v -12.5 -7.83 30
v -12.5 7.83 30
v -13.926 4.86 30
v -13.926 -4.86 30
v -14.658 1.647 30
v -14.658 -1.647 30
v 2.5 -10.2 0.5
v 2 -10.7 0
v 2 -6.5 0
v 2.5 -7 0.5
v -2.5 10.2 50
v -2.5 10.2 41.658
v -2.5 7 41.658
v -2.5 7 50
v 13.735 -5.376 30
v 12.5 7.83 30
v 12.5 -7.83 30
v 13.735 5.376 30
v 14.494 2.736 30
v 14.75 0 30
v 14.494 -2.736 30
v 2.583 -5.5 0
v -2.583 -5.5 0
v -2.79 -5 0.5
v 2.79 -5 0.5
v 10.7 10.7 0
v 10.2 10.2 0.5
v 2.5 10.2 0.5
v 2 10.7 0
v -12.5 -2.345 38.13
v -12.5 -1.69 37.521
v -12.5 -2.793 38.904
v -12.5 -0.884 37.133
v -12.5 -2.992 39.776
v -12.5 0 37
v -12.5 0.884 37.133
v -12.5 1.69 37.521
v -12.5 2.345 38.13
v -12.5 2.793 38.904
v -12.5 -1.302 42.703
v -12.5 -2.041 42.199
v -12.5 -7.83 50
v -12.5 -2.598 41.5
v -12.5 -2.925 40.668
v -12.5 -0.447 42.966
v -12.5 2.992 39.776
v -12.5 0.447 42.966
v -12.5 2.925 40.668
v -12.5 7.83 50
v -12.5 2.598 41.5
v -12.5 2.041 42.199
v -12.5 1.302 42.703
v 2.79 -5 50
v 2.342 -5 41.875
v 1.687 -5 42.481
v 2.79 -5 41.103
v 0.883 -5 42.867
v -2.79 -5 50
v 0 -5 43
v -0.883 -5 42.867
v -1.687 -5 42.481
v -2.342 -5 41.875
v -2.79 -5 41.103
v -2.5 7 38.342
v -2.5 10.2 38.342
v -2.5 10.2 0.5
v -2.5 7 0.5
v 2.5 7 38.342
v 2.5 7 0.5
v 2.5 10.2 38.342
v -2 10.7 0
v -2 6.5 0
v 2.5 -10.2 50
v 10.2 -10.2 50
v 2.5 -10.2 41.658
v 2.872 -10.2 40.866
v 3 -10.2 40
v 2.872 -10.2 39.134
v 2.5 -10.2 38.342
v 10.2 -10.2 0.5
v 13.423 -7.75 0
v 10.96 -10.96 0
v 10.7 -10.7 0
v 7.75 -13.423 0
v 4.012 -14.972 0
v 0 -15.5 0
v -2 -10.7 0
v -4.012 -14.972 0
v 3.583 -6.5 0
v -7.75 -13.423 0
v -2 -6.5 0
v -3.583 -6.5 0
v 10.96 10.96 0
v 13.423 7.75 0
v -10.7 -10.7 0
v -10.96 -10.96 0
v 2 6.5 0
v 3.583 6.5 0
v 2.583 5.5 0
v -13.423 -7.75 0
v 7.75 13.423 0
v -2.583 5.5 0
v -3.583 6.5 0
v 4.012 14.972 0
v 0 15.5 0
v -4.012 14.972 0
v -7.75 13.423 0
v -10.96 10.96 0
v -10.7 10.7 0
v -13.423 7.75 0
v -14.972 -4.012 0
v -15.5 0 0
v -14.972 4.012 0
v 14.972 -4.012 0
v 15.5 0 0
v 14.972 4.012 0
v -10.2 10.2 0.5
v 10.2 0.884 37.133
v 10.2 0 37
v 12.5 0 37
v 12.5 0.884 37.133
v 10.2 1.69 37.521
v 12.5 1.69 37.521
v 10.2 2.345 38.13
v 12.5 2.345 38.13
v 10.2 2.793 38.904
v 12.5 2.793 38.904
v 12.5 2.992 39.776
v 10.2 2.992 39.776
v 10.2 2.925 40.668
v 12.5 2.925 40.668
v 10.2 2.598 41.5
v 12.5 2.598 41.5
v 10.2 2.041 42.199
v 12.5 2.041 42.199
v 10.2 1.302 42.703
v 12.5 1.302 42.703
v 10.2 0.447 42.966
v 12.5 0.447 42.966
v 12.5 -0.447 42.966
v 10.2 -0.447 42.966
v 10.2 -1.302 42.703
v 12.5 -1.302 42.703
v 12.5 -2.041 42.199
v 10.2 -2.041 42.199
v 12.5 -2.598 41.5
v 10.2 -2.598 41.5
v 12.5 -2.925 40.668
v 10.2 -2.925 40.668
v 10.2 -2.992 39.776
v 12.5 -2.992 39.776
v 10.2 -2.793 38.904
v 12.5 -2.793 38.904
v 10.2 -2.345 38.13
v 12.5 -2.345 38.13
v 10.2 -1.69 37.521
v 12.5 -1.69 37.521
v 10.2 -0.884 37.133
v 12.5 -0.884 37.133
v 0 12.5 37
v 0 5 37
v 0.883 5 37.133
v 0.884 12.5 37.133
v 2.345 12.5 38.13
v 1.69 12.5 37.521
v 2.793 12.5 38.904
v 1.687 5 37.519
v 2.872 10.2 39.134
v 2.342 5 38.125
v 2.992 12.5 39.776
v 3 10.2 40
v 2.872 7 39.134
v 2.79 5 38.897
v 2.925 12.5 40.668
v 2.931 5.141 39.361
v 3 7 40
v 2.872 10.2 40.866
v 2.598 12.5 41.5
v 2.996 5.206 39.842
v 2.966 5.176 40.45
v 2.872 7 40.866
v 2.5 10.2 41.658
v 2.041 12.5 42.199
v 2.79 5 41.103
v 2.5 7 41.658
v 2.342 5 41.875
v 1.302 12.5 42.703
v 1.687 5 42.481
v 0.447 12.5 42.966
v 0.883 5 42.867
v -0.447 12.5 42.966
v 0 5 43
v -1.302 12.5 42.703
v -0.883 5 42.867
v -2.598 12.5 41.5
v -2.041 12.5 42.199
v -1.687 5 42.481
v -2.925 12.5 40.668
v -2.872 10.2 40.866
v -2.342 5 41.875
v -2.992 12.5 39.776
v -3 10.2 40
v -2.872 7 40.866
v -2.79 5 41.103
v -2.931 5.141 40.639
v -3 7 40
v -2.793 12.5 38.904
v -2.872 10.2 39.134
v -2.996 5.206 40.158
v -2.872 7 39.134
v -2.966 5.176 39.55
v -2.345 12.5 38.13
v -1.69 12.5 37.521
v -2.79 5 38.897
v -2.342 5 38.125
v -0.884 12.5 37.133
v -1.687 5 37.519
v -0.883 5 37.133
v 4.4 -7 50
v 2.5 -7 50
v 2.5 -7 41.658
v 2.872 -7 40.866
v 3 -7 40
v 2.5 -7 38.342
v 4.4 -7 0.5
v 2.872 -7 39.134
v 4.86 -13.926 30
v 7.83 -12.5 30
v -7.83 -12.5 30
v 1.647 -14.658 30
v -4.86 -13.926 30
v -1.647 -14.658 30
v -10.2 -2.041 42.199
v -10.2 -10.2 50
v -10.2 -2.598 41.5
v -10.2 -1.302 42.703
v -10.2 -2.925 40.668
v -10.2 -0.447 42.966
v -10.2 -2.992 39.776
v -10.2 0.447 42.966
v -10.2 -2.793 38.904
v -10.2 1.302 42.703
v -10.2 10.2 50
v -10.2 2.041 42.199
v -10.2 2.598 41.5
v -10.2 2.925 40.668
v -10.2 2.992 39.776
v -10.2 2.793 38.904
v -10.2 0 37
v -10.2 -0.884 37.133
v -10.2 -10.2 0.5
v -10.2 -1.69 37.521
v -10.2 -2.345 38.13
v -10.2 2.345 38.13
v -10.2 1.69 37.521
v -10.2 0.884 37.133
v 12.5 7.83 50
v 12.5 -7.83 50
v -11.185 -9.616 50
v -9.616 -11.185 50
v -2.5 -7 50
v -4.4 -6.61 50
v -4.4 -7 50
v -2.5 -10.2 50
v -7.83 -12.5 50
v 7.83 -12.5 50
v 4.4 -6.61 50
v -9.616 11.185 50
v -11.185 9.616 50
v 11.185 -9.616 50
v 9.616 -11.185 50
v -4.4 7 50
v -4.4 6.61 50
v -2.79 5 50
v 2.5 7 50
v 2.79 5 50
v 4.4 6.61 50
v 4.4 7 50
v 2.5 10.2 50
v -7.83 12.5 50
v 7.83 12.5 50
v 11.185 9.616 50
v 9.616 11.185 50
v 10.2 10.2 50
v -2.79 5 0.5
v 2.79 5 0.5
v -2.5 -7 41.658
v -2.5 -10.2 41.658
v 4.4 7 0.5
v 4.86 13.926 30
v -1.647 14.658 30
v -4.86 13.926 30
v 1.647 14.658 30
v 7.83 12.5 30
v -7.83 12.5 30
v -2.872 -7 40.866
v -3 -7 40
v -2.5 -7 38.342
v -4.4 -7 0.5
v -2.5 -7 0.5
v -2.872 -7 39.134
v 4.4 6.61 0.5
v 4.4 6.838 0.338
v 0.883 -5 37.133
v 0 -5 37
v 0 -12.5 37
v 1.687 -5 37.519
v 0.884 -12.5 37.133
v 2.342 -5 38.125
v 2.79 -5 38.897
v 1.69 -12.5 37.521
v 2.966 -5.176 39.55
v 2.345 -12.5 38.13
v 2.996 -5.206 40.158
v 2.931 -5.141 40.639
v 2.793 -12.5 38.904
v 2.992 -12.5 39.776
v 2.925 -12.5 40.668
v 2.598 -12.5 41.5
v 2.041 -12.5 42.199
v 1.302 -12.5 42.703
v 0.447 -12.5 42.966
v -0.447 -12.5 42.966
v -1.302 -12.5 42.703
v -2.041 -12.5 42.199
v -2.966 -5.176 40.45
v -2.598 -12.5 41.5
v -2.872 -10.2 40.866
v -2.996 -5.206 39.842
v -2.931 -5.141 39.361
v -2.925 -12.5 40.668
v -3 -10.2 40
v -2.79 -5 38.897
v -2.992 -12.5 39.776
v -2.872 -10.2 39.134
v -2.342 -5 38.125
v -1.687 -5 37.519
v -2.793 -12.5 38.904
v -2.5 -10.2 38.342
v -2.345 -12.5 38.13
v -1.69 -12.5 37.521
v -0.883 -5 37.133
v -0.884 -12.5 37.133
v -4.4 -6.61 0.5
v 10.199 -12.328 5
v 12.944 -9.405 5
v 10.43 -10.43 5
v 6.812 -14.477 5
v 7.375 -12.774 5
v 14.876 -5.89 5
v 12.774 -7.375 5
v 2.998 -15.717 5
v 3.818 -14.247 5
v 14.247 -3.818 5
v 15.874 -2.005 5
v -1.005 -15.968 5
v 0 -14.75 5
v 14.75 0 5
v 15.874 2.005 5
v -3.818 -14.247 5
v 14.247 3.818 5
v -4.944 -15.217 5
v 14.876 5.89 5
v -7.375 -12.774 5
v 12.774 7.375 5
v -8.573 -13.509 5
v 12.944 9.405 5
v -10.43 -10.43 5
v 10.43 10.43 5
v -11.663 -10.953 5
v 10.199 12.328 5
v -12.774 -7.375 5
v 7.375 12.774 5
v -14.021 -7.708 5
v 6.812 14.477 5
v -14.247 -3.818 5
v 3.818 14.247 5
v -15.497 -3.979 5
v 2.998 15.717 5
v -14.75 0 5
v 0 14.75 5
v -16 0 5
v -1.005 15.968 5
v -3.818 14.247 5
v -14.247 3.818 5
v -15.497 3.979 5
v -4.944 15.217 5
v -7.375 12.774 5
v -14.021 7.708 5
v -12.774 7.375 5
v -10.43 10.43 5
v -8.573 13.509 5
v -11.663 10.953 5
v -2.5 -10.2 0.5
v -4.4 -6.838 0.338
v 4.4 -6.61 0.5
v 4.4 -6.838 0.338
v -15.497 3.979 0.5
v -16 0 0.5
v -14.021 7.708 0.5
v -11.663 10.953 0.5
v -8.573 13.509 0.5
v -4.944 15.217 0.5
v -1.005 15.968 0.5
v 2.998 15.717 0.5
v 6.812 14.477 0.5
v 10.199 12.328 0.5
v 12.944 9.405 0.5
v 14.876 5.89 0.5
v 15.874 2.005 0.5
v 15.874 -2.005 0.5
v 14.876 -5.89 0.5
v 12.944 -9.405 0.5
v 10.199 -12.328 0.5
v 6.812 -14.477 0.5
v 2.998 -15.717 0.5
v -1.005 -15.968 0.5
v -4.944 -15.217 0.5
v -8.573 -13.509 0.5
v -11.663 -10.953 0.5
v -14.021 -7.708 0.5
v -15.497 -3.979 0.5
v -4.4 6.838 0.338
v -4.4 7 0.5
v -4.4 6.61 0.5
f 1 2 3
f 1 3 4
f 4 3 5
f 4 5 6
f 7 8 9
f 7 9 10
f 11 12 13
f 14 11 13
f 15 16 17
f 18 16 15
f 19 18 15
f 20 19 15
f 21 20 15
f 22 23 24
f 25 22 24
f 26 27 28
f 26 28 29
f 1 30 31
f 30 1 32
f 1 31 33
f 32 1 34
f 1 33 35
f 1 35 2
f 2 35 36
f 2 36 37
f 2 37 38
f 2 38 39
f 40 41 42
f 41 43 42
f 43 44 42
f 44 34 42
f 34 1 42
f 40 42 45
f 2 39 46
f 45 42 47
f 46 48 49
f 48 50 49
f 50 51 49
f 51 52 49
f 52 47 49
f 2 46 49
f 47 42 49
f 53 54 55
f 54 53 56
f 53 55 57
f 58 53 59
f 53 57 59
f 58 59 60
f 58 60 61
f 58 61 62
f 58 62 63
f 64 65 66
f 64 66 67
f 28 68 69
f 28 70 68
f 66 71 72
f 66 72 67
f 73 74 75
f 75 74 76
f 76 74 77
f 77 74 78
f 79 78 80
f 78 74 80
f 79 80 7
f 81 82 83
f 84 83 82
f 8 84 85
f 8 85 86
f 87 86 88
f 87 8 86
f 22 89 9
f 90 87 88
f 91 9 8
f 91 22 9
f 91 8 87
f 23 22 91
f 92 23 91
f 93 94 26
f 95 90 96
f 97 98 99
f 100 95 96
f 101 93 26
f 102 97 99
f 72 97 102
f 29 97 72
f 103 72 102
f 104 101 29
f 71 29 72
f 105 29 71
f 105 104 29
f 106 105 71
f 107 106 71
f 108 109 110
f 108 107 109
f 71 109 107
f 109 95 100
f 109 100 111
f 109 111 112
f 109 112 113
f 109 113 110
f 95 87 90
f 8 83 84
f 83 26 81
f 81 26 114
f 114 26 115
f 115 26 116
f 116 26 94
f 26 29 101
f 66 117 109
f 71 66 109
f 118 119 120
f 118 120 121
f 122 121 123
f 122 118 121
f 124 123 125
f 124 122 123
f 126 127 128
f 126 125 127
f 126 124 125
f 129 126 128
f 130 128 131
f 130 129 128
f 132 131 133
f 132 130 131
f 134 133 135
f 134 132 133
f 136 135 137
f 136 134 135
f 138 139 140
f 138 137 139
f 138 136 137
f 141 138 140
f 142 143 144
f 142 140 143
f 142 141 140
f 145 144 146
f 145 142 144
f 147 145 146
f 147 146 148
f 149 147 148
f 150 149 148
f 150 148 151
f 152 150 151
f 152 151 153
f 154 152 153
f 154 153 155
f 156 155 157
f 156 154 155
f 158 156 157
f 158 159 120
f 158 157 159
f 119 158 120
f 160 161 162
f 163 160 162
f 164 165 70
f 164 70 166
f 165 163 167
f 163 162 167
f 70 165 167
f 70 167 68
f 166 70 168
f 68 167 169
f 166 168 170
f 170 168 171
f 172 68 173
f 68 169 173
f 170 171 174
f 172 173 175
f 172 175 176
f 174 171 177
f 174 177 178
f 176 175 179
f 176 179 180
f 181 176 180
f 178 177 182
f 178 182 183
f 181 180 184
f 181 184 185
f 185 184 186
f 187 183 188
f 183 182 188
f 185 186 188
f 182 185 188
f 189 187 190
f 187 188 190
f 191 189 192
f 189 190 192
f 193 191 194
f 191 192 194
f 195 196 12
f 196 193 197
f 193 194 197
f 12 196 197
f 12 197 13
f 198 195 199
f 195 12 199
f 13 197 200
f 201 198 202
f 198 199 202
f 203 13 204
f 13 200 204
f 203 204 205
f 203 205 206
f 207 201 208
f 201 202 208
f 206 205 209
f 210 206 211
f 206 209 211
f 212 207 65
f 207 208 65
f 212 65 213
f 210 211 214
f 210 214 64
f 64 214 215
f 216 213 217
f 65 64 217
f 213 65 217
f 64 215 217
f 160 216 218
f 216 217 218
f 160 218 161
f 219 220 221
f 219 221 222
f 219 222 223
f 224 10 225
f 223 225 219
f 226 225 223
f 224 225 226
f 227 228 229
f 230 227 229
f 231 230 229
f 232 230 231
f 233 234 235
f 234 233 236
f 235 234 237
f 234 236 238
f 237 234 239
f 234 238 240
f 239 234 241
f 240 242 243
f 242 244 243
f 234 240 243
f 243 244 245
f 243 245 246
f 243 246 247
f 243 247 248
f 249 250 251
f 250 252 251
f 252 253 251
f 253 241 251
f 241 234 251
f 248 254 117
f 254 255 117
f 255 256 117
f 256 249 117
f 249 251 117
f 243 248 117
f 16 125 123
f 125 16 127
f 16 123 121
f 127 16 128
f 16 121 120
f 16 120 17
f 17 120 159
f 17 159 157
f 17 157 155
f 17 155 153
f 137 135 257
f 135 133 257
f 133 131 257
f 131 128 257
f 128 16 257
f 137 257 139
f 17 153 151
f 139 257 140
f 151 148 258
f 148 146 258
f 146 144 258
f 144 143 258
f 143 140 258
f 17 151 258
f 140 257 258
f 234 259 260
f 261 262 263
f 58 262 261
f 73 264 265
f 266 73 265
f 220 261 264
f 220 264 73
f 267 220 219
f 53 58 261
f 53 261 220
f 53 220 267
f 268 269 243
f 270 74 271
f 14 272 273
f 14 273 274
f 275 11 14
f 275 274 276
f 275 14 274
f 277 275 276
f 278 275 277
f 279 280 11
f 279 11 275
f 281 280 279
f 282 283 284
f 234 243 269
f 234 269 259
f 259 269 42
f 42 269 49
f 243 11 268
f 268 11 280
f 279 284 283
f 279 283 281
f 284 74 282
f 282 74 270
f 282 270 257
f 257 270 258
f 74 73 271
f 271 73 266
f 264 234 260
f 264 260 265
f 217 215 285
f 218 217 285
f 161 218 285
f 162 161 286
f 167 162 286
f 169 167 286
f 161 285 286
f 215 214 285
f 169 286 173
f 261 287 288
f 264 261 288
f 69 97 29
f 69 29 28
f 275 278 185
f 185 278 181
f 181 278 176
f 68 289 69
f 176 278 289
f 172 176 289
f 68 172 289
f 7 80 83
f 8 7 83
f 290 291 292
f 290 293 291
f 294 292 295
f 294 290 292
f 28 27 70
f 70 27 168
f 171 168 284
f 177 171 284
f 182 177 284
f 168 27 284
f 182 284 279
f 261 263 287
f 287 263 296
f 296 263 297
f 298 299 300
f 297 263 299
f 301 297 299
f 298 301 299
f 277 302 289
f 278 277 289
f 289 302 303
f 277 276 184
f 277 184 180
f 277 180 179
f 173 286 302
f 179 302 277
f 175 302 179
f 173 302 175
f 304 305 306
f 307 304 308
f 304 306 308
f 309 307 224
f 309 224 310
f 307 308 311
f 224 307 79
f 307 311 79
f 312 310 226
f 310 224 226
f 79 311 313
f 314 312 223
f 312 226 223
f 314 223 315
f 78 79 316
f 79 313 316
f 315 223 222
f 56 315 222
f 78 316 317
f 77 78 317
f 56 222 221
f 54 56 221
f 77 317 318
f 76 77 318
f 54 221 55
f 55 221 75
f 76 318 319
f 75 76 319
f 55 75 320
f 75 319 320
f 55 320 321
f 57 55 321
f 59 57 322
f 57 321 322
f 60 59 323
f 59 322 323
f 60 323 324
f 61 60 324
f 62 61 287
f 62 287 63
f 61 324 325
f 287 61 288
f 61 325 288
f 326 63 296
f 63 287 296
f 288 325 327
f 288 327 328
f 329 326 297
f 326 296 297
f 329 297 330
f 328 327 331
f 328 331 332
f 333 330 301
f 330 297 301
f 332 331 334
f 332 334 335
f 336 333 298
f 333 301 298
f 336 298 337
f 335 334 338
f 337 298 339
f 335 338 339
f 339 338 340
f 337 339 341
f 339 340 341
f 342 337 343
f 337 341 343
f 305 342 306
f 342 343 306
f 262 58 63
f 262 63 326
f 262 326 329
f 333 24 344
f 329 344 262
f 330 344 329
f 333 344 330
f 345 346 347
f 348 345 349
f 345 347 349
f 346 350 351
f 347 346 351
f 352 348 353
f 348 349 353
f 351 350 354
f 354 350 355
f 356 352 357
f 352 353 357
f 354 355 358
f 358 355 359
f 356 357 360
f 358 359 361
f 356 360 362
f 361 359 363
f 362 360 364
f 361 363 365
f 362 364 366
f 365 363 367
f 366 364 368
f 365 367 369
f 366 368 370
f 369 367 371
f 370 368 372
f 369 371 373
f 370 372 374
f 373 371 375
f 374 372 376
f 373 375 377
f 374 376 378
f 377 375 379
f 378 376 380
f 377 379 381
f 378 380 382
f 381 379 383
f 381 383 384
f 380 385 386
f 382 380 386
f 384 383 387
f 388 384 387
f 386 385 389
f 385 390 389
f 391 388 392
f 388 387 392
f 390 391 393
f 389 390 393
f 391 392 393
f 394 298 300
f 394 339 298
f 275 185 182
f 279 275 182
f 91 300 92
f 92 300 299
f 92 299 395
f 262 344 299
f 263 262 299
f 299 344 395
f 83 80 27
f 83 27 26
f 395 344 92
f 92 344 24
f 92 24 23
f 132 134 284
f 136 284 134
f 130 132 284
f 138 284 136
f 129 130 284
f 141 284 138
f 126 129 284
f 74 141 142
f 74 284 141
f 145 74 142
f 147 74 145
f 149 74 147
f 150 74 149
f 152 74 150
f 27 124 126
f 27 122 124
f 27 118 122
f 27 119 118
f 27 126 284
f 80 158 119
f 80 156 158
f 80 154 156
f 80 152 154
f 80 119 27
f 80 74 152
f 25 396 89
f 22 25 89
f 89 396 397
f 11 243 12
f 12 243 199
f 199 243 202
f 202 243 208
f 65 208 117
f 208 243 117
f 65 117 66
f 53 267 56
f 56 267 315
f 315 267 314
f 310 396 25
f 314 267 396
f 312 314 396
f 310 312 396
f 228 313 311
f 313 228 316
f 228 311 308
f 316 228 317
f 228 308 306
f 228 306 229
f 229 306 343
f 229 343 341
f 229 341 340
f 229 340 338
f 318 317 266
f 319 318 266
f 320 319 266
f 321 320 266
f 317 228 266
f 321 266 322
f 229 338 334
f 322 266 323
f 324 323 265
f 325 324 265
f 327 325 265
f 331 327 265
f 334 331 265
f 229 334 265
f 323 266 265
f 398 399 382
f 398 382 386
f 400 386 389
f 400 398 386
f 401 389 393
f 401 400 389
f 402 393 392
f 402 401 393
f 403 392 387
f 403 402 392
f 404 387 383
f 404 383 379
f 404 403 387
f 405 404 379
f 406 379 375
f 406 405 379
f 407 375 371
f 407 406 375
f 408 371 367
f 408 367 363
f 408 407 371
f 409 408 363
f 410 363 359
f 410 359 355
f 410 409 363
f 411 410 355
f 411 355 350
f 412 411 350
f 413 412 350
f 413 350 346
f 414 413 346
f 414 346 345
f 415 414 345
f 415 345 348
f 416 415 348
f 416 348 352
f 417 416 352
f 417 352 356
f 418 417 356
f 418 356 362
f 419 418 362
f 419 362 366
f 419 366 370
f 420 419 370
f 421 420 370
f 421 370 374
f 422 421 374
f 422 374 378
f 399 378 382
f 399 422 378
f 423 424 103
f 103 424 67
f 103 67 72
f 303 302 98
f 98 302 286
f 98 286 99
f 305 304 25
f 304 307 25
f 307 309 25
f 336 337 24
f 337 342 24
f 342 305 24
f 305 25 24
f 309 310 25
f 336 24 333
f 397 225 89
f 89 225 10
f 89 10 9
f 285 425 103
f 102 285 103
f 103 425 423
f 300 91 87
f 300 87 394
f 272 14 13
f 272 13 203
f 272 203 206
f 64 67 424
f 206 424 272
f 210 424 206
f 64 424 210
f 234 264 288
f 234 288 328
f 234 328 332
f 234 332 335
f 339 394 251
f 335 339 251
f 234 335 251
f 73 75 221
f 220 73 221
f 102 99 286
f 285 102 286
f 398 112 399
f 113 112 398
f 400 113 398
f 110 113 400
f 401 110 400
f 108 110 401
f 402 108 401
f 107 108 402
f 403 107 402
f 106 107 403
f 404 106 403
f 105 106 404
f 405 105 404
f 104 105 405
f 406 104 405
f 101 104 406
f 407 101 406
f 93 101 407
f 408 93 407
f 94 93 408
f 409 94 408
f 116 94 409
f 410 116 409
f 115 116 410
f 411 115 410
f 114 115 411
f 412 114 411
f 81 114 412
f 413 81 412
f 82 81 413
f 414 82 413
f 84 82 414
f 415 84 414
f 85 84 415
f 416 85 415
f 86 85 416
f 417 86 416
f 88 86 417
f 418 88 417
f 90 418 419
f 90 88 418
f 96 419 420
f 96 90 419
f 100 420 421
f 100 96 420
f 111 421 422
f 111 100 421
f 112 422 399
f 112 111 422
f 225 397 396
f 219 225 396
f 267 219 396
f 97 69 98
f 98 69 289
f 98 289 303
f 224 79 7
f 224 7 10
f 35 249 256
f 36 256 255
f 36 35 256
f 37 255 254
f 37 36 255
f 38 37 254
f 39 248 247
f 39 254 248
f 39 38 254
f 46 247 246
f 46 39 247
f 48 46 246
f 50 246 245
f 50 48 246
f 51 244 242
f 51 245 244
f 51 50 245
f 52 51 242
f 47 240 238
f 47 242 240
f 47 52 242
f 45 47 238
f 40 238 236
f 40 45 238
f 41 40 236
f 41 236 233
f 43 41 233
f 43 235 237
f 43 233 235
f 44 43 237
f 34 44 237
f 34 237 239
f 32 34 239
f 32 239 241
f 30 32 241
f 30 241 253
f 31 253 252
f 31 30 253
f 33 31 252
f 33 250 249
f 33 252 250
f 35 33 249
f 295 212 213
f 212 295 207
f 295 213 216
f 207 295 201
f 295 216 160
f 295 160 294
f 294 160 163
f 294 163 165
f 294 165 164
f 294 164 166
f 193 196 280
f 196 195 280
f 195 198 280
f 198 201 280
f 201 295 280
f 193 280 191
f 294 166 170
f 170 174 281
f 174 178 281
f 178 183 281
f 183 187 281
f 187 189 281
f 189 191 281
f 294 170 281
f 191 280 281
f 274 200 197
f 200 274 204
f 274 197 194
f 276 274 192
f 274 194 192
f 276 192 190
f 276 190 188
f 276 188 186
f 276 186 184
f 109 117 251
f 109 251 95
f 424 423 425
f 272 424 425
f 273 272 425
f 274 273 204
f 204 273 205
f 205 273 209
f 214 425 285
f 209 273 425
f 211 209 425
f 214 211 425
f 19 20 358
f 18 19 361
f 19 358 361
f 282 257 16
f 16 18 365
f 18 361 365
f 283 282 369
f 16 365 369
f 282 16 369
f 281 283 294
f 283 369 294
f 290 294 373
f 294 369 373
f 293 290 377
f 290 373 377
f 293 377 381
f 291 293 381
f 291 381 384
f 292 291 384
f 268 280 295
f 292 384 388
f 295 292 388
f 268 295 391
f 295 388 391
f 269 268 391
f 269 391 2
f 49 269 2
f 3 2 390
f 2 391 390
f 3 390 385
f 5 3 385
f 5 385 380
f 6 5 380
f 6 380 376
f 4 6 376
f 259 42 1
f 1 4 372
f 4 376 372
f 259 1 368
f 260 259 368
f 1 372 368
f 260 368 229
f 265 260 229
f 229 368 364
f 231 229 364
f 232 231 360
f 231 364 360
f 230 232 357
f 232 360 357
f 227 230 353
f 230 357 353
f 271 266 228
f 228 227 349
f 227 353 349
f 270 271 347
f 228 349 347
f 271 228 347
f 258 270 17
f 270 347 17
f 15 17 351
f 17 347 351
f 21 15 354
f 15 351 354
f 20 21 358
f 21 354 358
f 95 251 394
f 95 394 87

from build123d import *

# Parameters (mm, degrees)
SKETCH1_R           = 14.75
BOSS_EXTRUDE1_DEPTH = 50
SKETCH6_R           = 16
SKETCH6_R_2         = 14.75
BOSS_EXTRUDE4_DEPTH = 5
CUT_EXTRUDE3_DEPTH  = 20
SKETCH8_R           = 3
CUT_EXTRUDE4_DEPTH  = 60.73483071
CHAMFER2_SIZE       = 0.5


with BuildPart() as part:
    # Sketch1 → Boss-Extrude1 (new body)
    with BuildSketch(Plane.XY):
        Circle(SKETCH1_R)
        Polygon((-10.2, 10.2), (-2.5, 10.2), (-2.5, 7), (-4.4, 7), (-4.4, 6.61), (-2.79, 5), (2.79, 5), (4.4, 6.61), (4.4, 7), (2.5, 7), (2.5, 10.2), (10.2, 10.2), (10.2, 2.5), (10.2, -2.5), (10.2, -10.2), (2.5, -10.2), (2.5, -7), (4.4, -7), (4.4, -6.61), (2.79, -5), (-2.79, -5), (-4.4, -6.61), (-4.4, -7), (-2.5, -7), (-2.5, -10.2), (-10.2, -10.2), (-10.2, -2.5), (-10.2, 2.5), align=None, mode=Mode.SUBTRACT)
    extrude(amount=BOSS_EXTRUDE1_DEPTH)

    # Sketch6 → Boss-Extrude4 (add)
    with BuildSketch(Plane(origin=(0, 0, 0), x_dir=(-1, 0, 0), z_dir=(0, 0, -1))):
        Circle(SKETCH6_R)
        Circle(SKETCH6_R_2, mode=Mode.SUBTRACT)
    extrude(amount=-BOSS_EXTRUDE4_DEPTH)

    # Sketch7 → Cut-Extrude3 (cut)
    with BuildSketch(Plane.XY.offset(50)):
        Polygon((0, -12.5), (11.066614126, -12.5), (11.066614126, -16.552961951), (-11.340768707, -16.552961951), (-11.340768707, -12.5), align=None)
        Polygon((-11.340768707, 12.5), (0, 12.5), (11.066614126, 12.5), (11.066614126, 16.552961951), (-11.340768707, 16.552961951), align=None)
        Polygon((12.5, 0), (12.5, 11.066614126), (16.552961951, 11.066614126), (16.552961951, -11.340768707), (12.5, -11.340768707), align=None)
        Polygon((-12.5, -11.340768707), (-12.5, 0), (-12.5, 11.066614126), (-16.552961951, 11.066614126), (-16.552961951, -11.340768707), align=None)
    extrude(amount=-CUT_EXTRUDE3_DEPTH, mode=Mode.SUBTRACT)

    # Sketch8 → Cut-Extrude4 (cut, through all)
    with BuildSketch(Plane.XZ.offset(12.5)):
        with Locations(Location((0, 40, 0), (0, 0, 270))):
            Circle(SKETCH8_R)
    cut_extrude4 = extrude(amount=-CUT_EXTRUDE4_DEPTH, mode=Mode.SUBTRACT)

    # Mirror1: Cut-Extrude4 across plane
    add(cut_extrude4.mirror(Plane(origin=(0, 0, 0), x_dir=(0, 0, 1), z_dir=(0.7071067811865495, -0.7071067811865457, 0))), mode=Mode.SUBTRACT)

    # Chamfer2
    # the kernel refuses this chamfer: 0.5 mm, written as the material it takes off along each edge
    with BuildSketch(Plane(origin=(-5.30922724, 7.51922724, 0), x_dir=(-0.019442520806013736, -0.01944252080601385, 0.9996219169112968), z_dir=(0.7071067811865497, -0.7071067811865455, 0)), Plane(origin=(1.88077276, 4.09077276, 0), x_dir=(0.019442520806013972, -0.01944252080601405, 0.9996219169112968), z_dir=(0.7071067811865489, 0.7071067811865461, 0)), Plane(origin=(5.30922724, -7.51922724, 0), x_dir=(0.019442520806013767, 0.019442520806013813, 0.9996219169112968), z_dir=(-0.7071067811865485, 0.7071067811865467, 0)), Plane(origin=(-1.88077276, -4.09077276, 0), x_dir=(-0.019442520806013986, 0.019442520806014035, 0.9996219169112968), z_dir=(-0.7071067811865485, -0.7071067811865467, 0))) as chamfer2_piece_1:
        Polygon((CHAMFER2_SIZE * 0.999621916911, -CHAMFER2_SIZE * 0.0274958766106), (-CHAMFER2_SIZE * 0.0274958766106, -CHAMFER2_SIZE * 0.999621916911), (0, 0), align=None)
    extrude(amount=4.848566823, mode=Mode.SUBTRACT)
    with BuildSketch(Plane(origin=(-4.075841494, 5, 0), x_dir=(0, 0.9996219169112968, -0.02749587661058639), z_dir=(1, 0, 0)), Plane(origin=(4.075841494, -5, 0), x_dir=(0, -0.9996219169112968, -0.02749587661058639), z_dir=(-1, 0, 0))) as chamfer2_piece_2:
        Polygon((CHAMFER2_SIZE * 0.999621916911, CHAMFER2_SIZE * 0.0274958766106), (-CHAMFER2_SIZE * 0.0274958766106, CHAMFER2_SIZE * 0.999621916911), (0, 0), align=None)
    extrude(amount=8.151682988, mode=Mode.SUBTRACT)
    with BuildSketch(Plane(origin=(5.685841494, 7, 0), x_dir=(0, 0.02749587661058563, 0.9996219169112968), z_dir=(-1, 0, 0)), Plane(origin=(2.5, -7, 0), x_dir=(0, -0.02749587661058563, 0.9996219169112968), z_dir=(1, 0, 0)), Plane(origin=(-5.685841494, -7, 0), x_dir=(0, -0.02749587661058563, 0.9996219169112968), z_dir=(1, 0, 0)), Plane(origin=(-2.5, 7, 0), x_dir=(0, 0.02749587661058563, 0.9996219169112968), z_dir=(-1, 0, 0))) as chamfer2_piece_3:
        Polygon((CHAMFER2_SIZE * 0.999621916911, -CHAMFER2_SIZE * 0.0274958766106), (-CHAMFER2_SIZE * 0.0274958766106, -CHAMFER2_SIZE * 0.999621916911), (0, 0), align=None)
    extrude(amount=3.185841494, mode=Mode.SUBTRACT)
    with BuildSketch(Plane(origin=(2.5, 7, 0), x_dir=(-0.9996219169112968, 2.3583319446590707e-15, -0.027495876610586365), z_dir=(0, 1, 0)), Plane(origin=(2.5, -10.2, 0), x_dir=(-0.9996219169112968, -2.0808811276403563e-15, -0.027495876610586365), z_dir=(0, 1, 0)), Plane(origin=(-2.5, -7, 0), x_dir=(0.9996219169112968, -2.0808811276403563e-15, -0.027495876610586365), z_dir=(0, -1, 0)), Plane(origin=(-2.5, 10.2, 0), x_dir=(0.9996219169112968, -9.19749458417038e-14, -0.027495876610586365), z_dir=(0, -1, 0))) as chamfer2_piece_4:
        Polygon((CHAMFER2_SIZE * 0.999621916911, CHAMFER2_SIZE * 0.0274958766106), (-CHAMFER2_SIZE * 0.0274958766106, CHAMFER2_SIZE * 0.999621916911), (0, 0), align=None)
    extrude(amount=3.2, mode=Mode.SUBTRACT)
    with BuildSketch(Plane(origin=(2.5, 10.2, 0), x_dir=(0, -0.02749587661058563, 0.9996219169112968), z_dir=(1, 0, 0)), Plane(origin=(10.2, -10.2, 0), x_dir=(0, 0.02749587661058563, 0.9996219169112968), z_dir=(-1, 0, 0)), Plane(origin=(-2.5, -10.2, 0), x_dir=(0, 0.02749587661058563, 0.9996219169112968), z_dir=(-1, 0, 0)), Plane(origin=(-10.2, 10.2, 0), x_dir=(0, -0.02749587661058563, 0.9996219169112968), z_dir=(1, 0, 0))) as chamfer2_piece_5:
        Polygon((CHAMFER2_SIZE * 0.999621916911, -CHAMFER2_SIZE * 0.0274958766106), (-CHAMFER2_SIZE * 0.0274958766106, -CHAMFER2_SIZE * 0.999621916911), (0, 0), align=None)
    extrude(amount=7.7, mode=Mode.SUBTRACT)
    with BuildSketch(Plane(origin=(10.2, 10.2, 0), x_dir=(-0.02749587661058563, 0, 0.9996219169112968), z_dir=(0, -1, 0)), Plane(origin=(-10.2, -10.2, 0), x_dir=(0.02749587661058563, 0, 0.9996219169112968), z_dir=(0, 1, 0))) as chamfer2_piece_6:
        Polygon((CHAMFER2_SIZE * 0.999621916911, -CHAMFER2_SIZE * 0.0274958766106), (-CHAMFER2_SIZE * 0.0274958766106, -CHAMFER2_SIZE * 0.999621916911), (0, 0), align=None)
    extrude(amount=20.4, mode=Mode.SUBTRACT)
    with BuildSketch(Plane(origin=(0, 0, 0), x_dir=(-1, 0, 0), z_dir=(0, -1, 0))) as chamfer2_piece_7:
        Polygon((16, -CHAMFER2_SIZE), (16 - CHAMFER2_SIZE, 0), (16, 0), align=None)
    revolve(axis=Axis((0, 0, 0), (0, 0, -1)), mode=Mode.SUBTRACT)
    with BuildSketch(Plane(origin=(5.685841494, 7, 0), x_dir=(0, 0.02749587661058563, 0.9996219169112968), z_dir=(-1, 0, 0))) as chamfer2_piece_8a_section:
        Polygon((CHAMFER2_SIZE * 0.999621916911, -CHAMFER2_SIZE * 0.0274958766106), (-CHAMFER2_SIZE * 0.0274958766106, -CHAMFER2_SIZE * 0.999621916911), (0, 0), align=None)
    chamfer2_piece_8a = extrude(amount=4.471682988, mode=Mode.PRIVATE)
    chamfer2_piece_8a = split(chamfer2_piece_8a, bisect_by=Plane(origin=(2.5, 6.835103187, 0.164896813), z_dir=(-1, 0, 0)), keep=Keep.TOP, mode=Mode.PRIVATE)
    with BuildSketch(Plane(origin=(2.5, 5.714158506, 0), x_dir=(-0.9996219169112968, 2.3583319446590707e-15, -0.027495876610586365), z_dir=(0, 1, 0))) as chamfer2_piece_8b_section:
        Polygon((CHAMFER2_SIZE * 0.999621916911, CHAMFER2_SIZE * 0.0274958766106), (-CHAMFER2_SIZE * 0.0274958766106, CHAMFER2_SIZE * 0.999621916911), (0, 0), align=None)
    chamfer2_piece_8b = extrude(amount=4.485841494, mode=Mode.PRIVATE)
    chamfer2_piece_8b = split(chamfer2_piece_8b, bisect_by=Plane(origin=(2.335103187, 7, 0.164896813), z_dir=(0, -1, 0)), keep=Keep.TOP, mode=Mode.PRIVATE)
    chamfer2_piece_8 = chamfer2_piece_8a & chamfer2_piece_8b
    add(chamfer2_piece_8, mode=Mode.SUBTRACT)
    with BuildSketch(Plane(origin=(1.214158506, 10.2, 0), x_dir=(0, -0.02749587661058563, 0.9996219169112968), z_dir=(1, 0, 0))) as chamfer2_piece_9a_section:
        Polygon((CHAMFER2_SIZE * 0.999621916911, -CHAMFER2_SIZE * 0.0274958766106), (-CHAMFER2_SIZE * 0.0274958766106, -CHAMFER2_SIZE * 0.999621916911), (0, 0), align=None)
    chamfer2_piece_9a = extrude(amount=8.985841494, mode=Mode.PRIVATE)
    chamfer2_piece_9a = split(chamfer2_piece_9a, bisect_by=Plane(origin=(2.5, 10.364896813, 0.164896813), z_dir=(-1, 0, 0)), keep=Keep.TOP, mode=Mode.PRIVATE)
    with BuildSketch(Plane(origin=(2.5, 7, 0), x_dir=(-0.9996219169112968, 2.3583319446590707e-15, -0.027495876610586365), z_dir=(0, 1, 0))) as chamfer2_piece_9b_section:
        Polygon((CHAMFER2_SIZE * 0.999621916911, CHAMFER2_SIZE * 0.0274958766106), (-CHAMFER2_SIZE * 0.0274958766106, CHAMFER2_SIZE * 0.999621916911), (0, 0), align=None)
    chamfer2_piece_9b = extrude(amount=4.485841494, mode=Mode.PRIVATE)
    chamfer2_piece_9b = split(chamfer2_piece_9b, bisect_by=Plane(origin=(2.335103187, 10.2, 0.164896813), z_dir=(0, 1, 0)), keep=Keep.TOP, mode=Mode.PRIVATE)
    chamfer2_piece_9 = chamfer2_piece_9a & chamfer2_piece_9b
    add(chamfer2_piece_9, mode=Mode.SUBTRACT)
    with BuildSketch(Plane(origin=(2.5, 10.2, 0), x_dir=(0, -0.02749587661058563, 0.9996219169112968), z_dir=(1, 0, 0))) as chamfer2_piece_10a_section:
        Polygon((CHAMFER2_SIZE * 0.999621916911, -CHAMFER2_SIZE * 0.0274958766106), (-CHAMFER2_SIZE * 0.0274958766106, -CHAMFER2_SIZE * 0.999621916911), (0, 0), align=None)
    chamfer2_piece_10a = extrude(amount=8.985841494, mode=Mode.PRIVATE)
    chamfer2_piece_10a = split(chamfer2_piece_10a, bisect_by=Plane(origin=(10.2, 10.364896813, 0.164896813), z_dir=(1, 0, 0)), keep=Keep.TOP, mode=Mode.PRIVATE)
    with BuildSketch(Plane(origin=(10.2, 11.485841494, 0), x_dir=(-0.02749587661058563, 0, 0.9996219169112968), z_dir=(0, -1, 0))) as chamfer2_piece_10b_section:
        Polygon((CHAMFER2_SIZE * 0.999621916911, -CHAMFER2_SIZE * 0.0274958766106), (-CHAMFER2_SIZE * 0.0274958766106, -CHAMFER2_SIZE * 0.999621916911), (0, 0), align=None)
    chamfer2_piece_10b = extrude(amount=21.685841494, mode=Mode.PRIVATE)
    chamfer2_piece_10b = split(chamfer2_piece_10b, bisect_by=Plane(origin=(10.364896813, 10.2, 0.164896813), z_dir=(0, 1, 0)), keep=Keep.TOP, mode=Mode.PRIVATE)
    chamfer2_piece_10 = chamfer2_piece_10a & chamfer2_piece_10b
    add(chamfer2_piece_10, mode=Mode.SUBTRACT)
    with BuildSketch(Plane(origin=(10.2, 10.2, 0), x_dir=(-0.02749587661058563, 0, 0.9996219169112968), z_dir=(0, -1, 0))) as chamfer2_piece_11a_section:
        Polygon((CHAMFER2_SIZE * 0.999621916911, -CHAMFER2_SIZE * 0.0274958766106), (-CHAMFER2_SIZE * 0.0274958766106, -CHAMFER2_SIZE * 0.999621916911), (0, 0), align=None)
    chamfer2_piece_11a = extrude(amount=21.685841494, mode=Mode.PRIVATE)
    chamfer2_piece_11a = split(chamfer2_piece_11a, bisect_by=Plane(origin=(10.364896813, -10.2, 0.164896813), z_dir=(0, -1, 0)), keep=Keep.TOP, mode=Mode.PRIVATE)
    with BuildSketch(Plane(origin=(11.485841494, -10.2, 0), x_dir=(0, 0.02749587661058563, 0.9996219169112968), z_dir=(-1, 0, 0))) as chamfer2_piece_11b_section:
        Polygon((CHAMFER2_SIZE * 0.999621916911, -CHAMFER2_SIZE * 0.0274958766106), (-CHAMFER2_SIZE * 0.0274958766106, -CHAMFER2_SIZE * 0.999621916911), (0, 0), align=None)
    chamfer2_piece_11b = extrude(amount=8.985841494, mode=Mode.PRIVATE)
    chamfer2_piece_11b = split(chamfer2_piece_11b, bisect_by=Plane(origin=(10.2, -10.364896813, 0.164896813), z_dir=(1, 0, 0)), keep=Keep.TOP, mode=Mode.PRIVATE)
    chamfer2_piece_11 = chamfer2_piece_11a & chamfer2_piece_11b
    add(chamfer2_piece_11, mode=Mode.SUBTRACT)
    with BuildSketch(Plane(origin=(10.2, -10.2, 0), x_dir=(0, 0.02749587661058563, 0.9996219169112968), z_dir=(-1, 0, 0))) as chamfer2_piece_12a_section:
        Polygon((CHAMFER2_SIZE * 0.999621916911, -CHAMFER2_SIZE * 0.0274958766106), (-CHAMFER2_SIZE * 0.0274958766106, -CHAMFER2_SIZE * 0.999621916911), (0, 0), align=None)
    chamfer2_piece_12a = extrude(amount=8.985841494, mode=Mode.PRIVATE)
    chamfer2_piece_12a = split(chamfer2_piece_12a, bisect_by=Plane(origin=(2.5, -10.364896813, 0.164896813), z_dir=(-1, 0, 0)), keep=Keep.TOP, mode=Mode.PRIVATE)
    with BuildSketch(Plane(origin=(2.5, -11.485841494, 0), x_dir=(-0.9996219169112968, -2.0808811276403563e-15, -0.027495876610586365), z_dir=(0, 1, 0))) as chamfer2_piece_12b_section:
        Polygon((CHAMFER2_SIZE * 0.999621916911, CHAMFER2_SIZE * 0.0274958766106), (-CHAMFER2_SIZE * 0.0274958766106, CHAMFER2_SIZE * 0.999621916911), (0, 0), align=None)
    chamfer2_piece_12b = extrude(amount=4.485841494, mode=Mode.PRIVATE)
    chamfer2_piece_12b = split(chamfer2_piece_12b, bisect_by=Plane(origin=(2.335103187, -10.2, 0.164896813), z_dir=(0, -1, 0)), keep=Keep.TOP, mode=Mode.PRIVATE)
    chamfer2_piece_12 = chamfer2_piece_12a & chamfer2_piece_12b
    add(chamfer2_piece_12, mode=Mode.SUBTRACT)
    with BuildSketch(Plane(origin=(1.214158506, -7, 0), x_dir=(0, -0.02749587661058563, 0.9996219169112968), z_dir=(1, 0, 0))) as chamfer2_piece_13a_section:
        Polygon((CHAMFER2_SIZE * 0.999621916911, -CHAMFER2_SIZE * 0.0274958766106), (-CHAMFER2_SIZE * 0.0274958766106, -CHAMFER2_SIZE * 0.999621916911), (0, 0), align=None)
    chamfer2_piece_13a = extrude(amount=4.471682988, mode=Mode.PRIVATE)
    chamfer2_piece_13a = split(chamfer2_piece_13a, bisect_by=Plane(origin=(2.5, -6.835103187, 0.164896813), z_dir=(-1, 0, 0)), keep=Keep.TOP, mode=Mode.PRIVATE)
    with BuildSketch(Plane(origin=(2.5, -10.2, 0), x_dir=(-0.9996219169112968, -2.0808811276403563e-15, -0.027495876610586365), z_dir=(0, 1, 0))) as chamfer2_piece_13b_section:
        Polygon((CHAMFER2_SIZE * 0.999621916911, CHAMFER2_SIZE * 0.0274958766106), (-CHAMFER2_SIZE * 0.0274958766106, CHAMFER2_SIZE * 0.999621916911), (0, 0), align=None)
    chamfer2_piece_13b = extrude(amount=4.485841494, mode=Mode.PRIVATE)
    chamfer2_piece_13b = split(chamfer2_piece_13b, bisect_by=Plane(origin=(2.335103187, -7, 0.164896813), z_dir=(0, 1, 0)), keep=Keep.TOP, mode=Mode.PRIVATE)
    chamfer2_piece_13 = chamfer2_piece_13a & chamfer2_piece_13b
    add(chamfer2_piece_13, mode=Mode.SUBTRACT)
    with BuildSketch(Plane(origin=(-5.685841494, -7, 0), x_dir=(0, -0.02749587661058563, 0.9996219169112968), z_dir=(1, 0, 0))) as chamfer2_piece_14a_section:
        Polygon((CHAMFER2_SIZE * 0.999621916911, -CHAMFER2_SIZE * 0.0274958766106), (-CHAMFER2_SIZE * 0.0274958766106, -CHAMFER2_SIZE * 0.999621916911), (0, 0), align=None)
    chamfer2_piece_14a = extrude(amount=4.471682988, mode=Mode.PRIVATE)
    chamfer2_piece_14a = split(chamfer2_piece_14a, bisect_by=Plane(origin=(-2.5, -6.835103187, 0.164896813), z_dir=(1, 0, 0)), keep=Keep.TOP, mode=Mode.PRIVATE)
    with BuildSketch(Plane(origin=(-2.5, -5.714158506, 0), x_dir=(0.9996219169112968, -2.0808811276403563e-15, -0.027495876610586365), z_dir=(0, -1, 0))) as chamfer2_piece_14b_section:
        Polygon((CHAMFER2_SIZE * 0.999621916911, CHAMFER2_SIZE * 0.0274958766106), (-CHAMFER2_SIZE * 0.0274958766106, CHAMFER2_SIZE * 0.999621916911), (0, 0), align=None)
    chamfer2_piece_14b = extrude(amount=4.485841494, mode=Mode.PRIVATE)
    chamfer2_piece_14b = split(chamfer2_piece_14b, bisect_by=Plane(origin=(-2.335103187, -7, 0.164896813), z_dir=(0, 1, 0)), keep=Keep.TOP, mode=Mode.PRIVATE)
    chamfer2_piece_14 = chamfer2_piece_14a & chamfer2_piece_14b
    add(chamfer2_piece_14, mode=Mode.SUBTRACT)
    with BuildSketch(Plane(origin=(-1.214158506, -10.2, 0), x_dir=(0, 0.02749587661058563, 0.9996219169112968), z_dir=(-1, 0, 0))) as chamfer2_piece_15a_section:
        Polygon((CHAMFER2_SIZE * 0.999621916911, -CHAMFER2_SIZE * 0.0274958766106), (-CHAMFER2_SIZE * 0.0274958766106, -CHAMFER2_SIZE * 0.999621916911), (0, 0), align=None)
    chamfer2_piece_15a = extrude(amount=8.985841494, mode=Mode.PRIVATE)
    chamfer2_piece_15a = split(chamfer2_piece_15a, bisect_by=Plane(origin=(-2.5, -10.364896813, 0.164896813), z_dir=(1, 0, 0)), keep=Keep.TOP, mode=Mode.PRIVATE)
    with BuildSketch(Plane(origin=(-2.5, -7, 0), x_dir=(0.9996219169112968, -2.0808811276403563e-15, -0.027495876610586365), z_dir=(0, -1, 0))) as chamfer2_piece_15b_section:
        Polygon((CHAMFER2_SIZE * 0.999621916911, CHAMFER2_SIZE * 0.0274958766106), (-CHAMFER2_SIZE * 0.0274958766106, CHAMFER2_SIZE * 0.999621916911), (0, 0), align=None)
    chamfer2_piece_15b = extrude(amount=4.485841494, mode=Mode.PRIVATE)
    chamfer2_piece_15b = split(chamfer2_piece_15b, bisect_by=Plane(origin=(-2.335103187, -10.2, 0.164896813), z_dir=(0, -1, 0)), keep=Keep.TOP, mode=Mode.PRIVATE)
    chamfer2_piece_15 = chamfer2_piece_15a & chamfer2_piece_15b
    add(chamfer2_piece_15, mode=Mode.SUBTRACT)
    with BuildSketch(Plane(origin=(-10.2, -11.485841494, 0), x_dir=(0.02749587661058563, 0, 0.9996219169112968), z_dir=(0, 1, 0))) as chamfer2_piece_16a_section:
        Polygon((CHAMFER2_SIZE * 0.999621916911, -CHAMFER2_SIZE * 0.0274958766106), (-CHAMFER2_SIZE * 0.0274958766106, -CHAMFER2_SIZE * 0.999621916911), (0, 0), align=None)
    chamfer2_piece_16a = extrude(amount=21.685841494, mode=Mode.PRIVATE)
    chamfer2_piece_16a = split(chamfer2_piece_16a, bisect_by=Plane(origin=(-10.364896813, -10.2, 0.164896813), z_dir=(0, -1, 0)), keep=Keep.TOP, mode=Mode.PRIVATE)
    with BuildSketch(Plane(origin=(-2.5, -10.2, 0), x_dir=(0, 0.02749587661058563, 0.9996219169112968), z_dir=(-1, 0, 0))) as chamfer2_piece_16b_section:
        Polygon((CHAMFER2_SIZE * 0.999621916911, -CHAMFER2_SIZE * 0.0274958766106), (-CHAMFER2_SIZE * 0.0274958766106, -CHAMFER2_SIZE * 0.999621916911), (0, 0), align=None)
    chamfer2_piece_16b = extrude(amount=8.985841494, mode=Mode.PRIVATE)
    chamfer2_piece_16b = split(chamfer2_piece_16b, bisect_by=Plane(origin=(-10.2, -10.364896813, 0.164896813), z_dir=(-1, 0, 0)), keep=Keep.TOP, mode=Mode.PRIVATE)
    chamfer2_piece_16 = chamfer2_piece_16a & chamfer2_piece_16b
    add(chamfer2_piece_16, mode=Mode.SUBTRACT)
    with BuildSketch(Plane(origin=(-11.485841494, 10.2, 0), x_dir=(0, -0.02749587661058563, 0.9996219169112968), z_dir=(1, 0, 0))) as chamfer2_piece_17a_section:
        Polygon((CHAMFER2_SIZE * 0.999621916911, -CHAMFER2_SIZE * 0.0274958766106), (-CHAMFER2_SIZE * 0.0274958766106, -CHAMFER2_SIZE * 0.999621916911), (0, 0), align=None)
    chamfer2_piece_17a = extrude(amount=8.985841494, mode=Mode.PRIVATE)
    chamfer2_piece_17a = split(chamfer2_piece_17a, bisect_by=Plane(origin=(-10.2, 10.364896813, 0.164896813), z_dir=(-1, 0, 0)), keep=Keep.TOP, mode=Mode.PRIVATE)
    with BuildSketch(Plane(origin=(-10.2, -10.2, 0), x_dir=(0.02749587661058563, 0, 0.9996219169112968), z_dir=(0, 1, 0))) as chamfer2_piece_17b_section:
        Polygon((CHAMFER2_SIZE * 0.999621916911, -CHAMFER2_SIZE * 0.0274958766106), (-CHAMFER2_SIZE * 0.0274958766106, -CHAMFER2_SIZE * 0.999621916911), (0, 0), align=None)
    chamfer2_piece_17b = extrude(amount=21.685841494, mode=Mode.PRIVATE)
    chamfer2_piece_17b = split(chamfer2_piece_17b, bisect_by=Plane(origin=(-10.364896813, 10.2, 0.164896813), z_dir=(0, 1, 0)), keep=Keep.TOP, mode=Mode.PRIVATE)
    chamfer2_piece_17 = chamfer2_piece_17a & chamfer2_piece_17b
    add(chamfer2_piece_17, mode=Mode.SUBTRACT)
    with BuildSketch(Plane(origin=(-10.2, 10.2, 0), x_dir=(0, -0.02749587661058563, 0.9996219169112968), z_dir=(1, 0, 0))) as chamfer2_piece_18a_section:
        Polygon((CHAMFER2_SIZE * 0.999621916911, -CHAMFER2_SIZE * 0.0274958766106), (-CHAMFER2_SIZE * 0.0274958766106, -CHAMFER2_SIZE * 0.999621916911), (0, 0), align=None)
    chamfer2_piece_18a = extrude(amount=8.985841494, mode=Mode.PRIVATE)
    chamfer2_piece_18a = split(chamfer2_piece_18a, bisect_by=Plane(origin=(-2.5, 10.364896813, 0.164896813), z_dir=(1, 0, 0)), keep=Keep.TOP, mode=Mode.PRIVATE)
    with BuildSketch(Plane(origin=(-2.5, 11.485841494, 0), x_dir=(0.9996219169112968, -9.19749458417038e-14, -0.027495876610586365), z_dir=(0, -1, 0))) as chamfer2_piece_18b_section:
        Polygon((CHAMFER2_SIZE * 0.999621916911, CHAMFER2_SIZE * 0.0274958766106), (-CHAMFER2_SIZE * 0.0274958766106, CHAMFER2_SIZE * 0.999621916911), (0, 0), align=None)
    chamfer2_piece_18b = extrude(amount=4.485841494, mode=Mode.PRIVATE)
    chamfer2_piece_18b = split(chamfer2_piece_18b, bisect_by=Plane(origin=(-2.335103187, 10.2, 0.164896813), z_dir=(0, 1, 0)), keep=Keep.TOP, mode=Mode.PRIVATE)
    chamfer2_piece_18 = chamfer2_piece_18a & chamfer2_piece_18b
    add(chamfer2_piece_18, mode=Mode.SUBTRACT)
    with BuildSketch(Plane(origin=(-1.214158506, 7, 0), x_dir=(0, 0.02749587661058563, 0.9996219169112968), z_dir=(-1, 0, 0))) as chamfer2_piece_19a_section:
        Polygon((CHAMFER2_SIZE * 0.999621916911, -CHAMFER2_SIZE * 0.0274958766106), (-CHAMFER2_SIZE * 0.0274958766106, -CHAMFER2_SIZE * 0.999621916911), (0, 0), align=None)
    chamfer2_piece_19a = extrude(amount=4.471682988, mode=Mode.PRIVATE)
    chamfer2_piece_19a = split(chamfer2_piece_19a, bisect_by=Plane(origin=(-2.5, 6.835103187, 0.164896813), z_dir=(1, 0, 0)), keep=Keep.TOP, mode=Mode.PRIVATE)
    with BuildSketch(Plane(origin=(-2.5, 10.2, 0), x_dir=(0.9996219169112968, -9.19749458417038e-14, -0.027495876610586365), z_dir=(0, -1, 0))) as chamfer2_piece_19b_section:
        Polygon((CHAMFER2_SIZE * 0.999621916911, CHAMFER2_SIZE * 0.0274958766106), (-CHAMFER2_SIZE * 0.0274958766106, CHAMFER2_SIZE * 0.999621916911), (0, 0), align=None)
    chamfer2_piece_19b = extrude(amount=4.485841494, mode=Mode.PRIVATE)
    chamfer2_piece_19b = split(chamfer2_piece_19b, bisect_by=Plane(origin=(-2.335103187, 7, 0.164896813), z_dir=(0, -1, 0)), keep=Keep.TOP, mode=Mode.PRIVATE)
    chamfer2_piece_19 = chamfer2_piece_19a & chamfer2_piece_19b
    add(chamfer2_piece_19, mode=Mode.SUBTRACT)


solid = part.part
